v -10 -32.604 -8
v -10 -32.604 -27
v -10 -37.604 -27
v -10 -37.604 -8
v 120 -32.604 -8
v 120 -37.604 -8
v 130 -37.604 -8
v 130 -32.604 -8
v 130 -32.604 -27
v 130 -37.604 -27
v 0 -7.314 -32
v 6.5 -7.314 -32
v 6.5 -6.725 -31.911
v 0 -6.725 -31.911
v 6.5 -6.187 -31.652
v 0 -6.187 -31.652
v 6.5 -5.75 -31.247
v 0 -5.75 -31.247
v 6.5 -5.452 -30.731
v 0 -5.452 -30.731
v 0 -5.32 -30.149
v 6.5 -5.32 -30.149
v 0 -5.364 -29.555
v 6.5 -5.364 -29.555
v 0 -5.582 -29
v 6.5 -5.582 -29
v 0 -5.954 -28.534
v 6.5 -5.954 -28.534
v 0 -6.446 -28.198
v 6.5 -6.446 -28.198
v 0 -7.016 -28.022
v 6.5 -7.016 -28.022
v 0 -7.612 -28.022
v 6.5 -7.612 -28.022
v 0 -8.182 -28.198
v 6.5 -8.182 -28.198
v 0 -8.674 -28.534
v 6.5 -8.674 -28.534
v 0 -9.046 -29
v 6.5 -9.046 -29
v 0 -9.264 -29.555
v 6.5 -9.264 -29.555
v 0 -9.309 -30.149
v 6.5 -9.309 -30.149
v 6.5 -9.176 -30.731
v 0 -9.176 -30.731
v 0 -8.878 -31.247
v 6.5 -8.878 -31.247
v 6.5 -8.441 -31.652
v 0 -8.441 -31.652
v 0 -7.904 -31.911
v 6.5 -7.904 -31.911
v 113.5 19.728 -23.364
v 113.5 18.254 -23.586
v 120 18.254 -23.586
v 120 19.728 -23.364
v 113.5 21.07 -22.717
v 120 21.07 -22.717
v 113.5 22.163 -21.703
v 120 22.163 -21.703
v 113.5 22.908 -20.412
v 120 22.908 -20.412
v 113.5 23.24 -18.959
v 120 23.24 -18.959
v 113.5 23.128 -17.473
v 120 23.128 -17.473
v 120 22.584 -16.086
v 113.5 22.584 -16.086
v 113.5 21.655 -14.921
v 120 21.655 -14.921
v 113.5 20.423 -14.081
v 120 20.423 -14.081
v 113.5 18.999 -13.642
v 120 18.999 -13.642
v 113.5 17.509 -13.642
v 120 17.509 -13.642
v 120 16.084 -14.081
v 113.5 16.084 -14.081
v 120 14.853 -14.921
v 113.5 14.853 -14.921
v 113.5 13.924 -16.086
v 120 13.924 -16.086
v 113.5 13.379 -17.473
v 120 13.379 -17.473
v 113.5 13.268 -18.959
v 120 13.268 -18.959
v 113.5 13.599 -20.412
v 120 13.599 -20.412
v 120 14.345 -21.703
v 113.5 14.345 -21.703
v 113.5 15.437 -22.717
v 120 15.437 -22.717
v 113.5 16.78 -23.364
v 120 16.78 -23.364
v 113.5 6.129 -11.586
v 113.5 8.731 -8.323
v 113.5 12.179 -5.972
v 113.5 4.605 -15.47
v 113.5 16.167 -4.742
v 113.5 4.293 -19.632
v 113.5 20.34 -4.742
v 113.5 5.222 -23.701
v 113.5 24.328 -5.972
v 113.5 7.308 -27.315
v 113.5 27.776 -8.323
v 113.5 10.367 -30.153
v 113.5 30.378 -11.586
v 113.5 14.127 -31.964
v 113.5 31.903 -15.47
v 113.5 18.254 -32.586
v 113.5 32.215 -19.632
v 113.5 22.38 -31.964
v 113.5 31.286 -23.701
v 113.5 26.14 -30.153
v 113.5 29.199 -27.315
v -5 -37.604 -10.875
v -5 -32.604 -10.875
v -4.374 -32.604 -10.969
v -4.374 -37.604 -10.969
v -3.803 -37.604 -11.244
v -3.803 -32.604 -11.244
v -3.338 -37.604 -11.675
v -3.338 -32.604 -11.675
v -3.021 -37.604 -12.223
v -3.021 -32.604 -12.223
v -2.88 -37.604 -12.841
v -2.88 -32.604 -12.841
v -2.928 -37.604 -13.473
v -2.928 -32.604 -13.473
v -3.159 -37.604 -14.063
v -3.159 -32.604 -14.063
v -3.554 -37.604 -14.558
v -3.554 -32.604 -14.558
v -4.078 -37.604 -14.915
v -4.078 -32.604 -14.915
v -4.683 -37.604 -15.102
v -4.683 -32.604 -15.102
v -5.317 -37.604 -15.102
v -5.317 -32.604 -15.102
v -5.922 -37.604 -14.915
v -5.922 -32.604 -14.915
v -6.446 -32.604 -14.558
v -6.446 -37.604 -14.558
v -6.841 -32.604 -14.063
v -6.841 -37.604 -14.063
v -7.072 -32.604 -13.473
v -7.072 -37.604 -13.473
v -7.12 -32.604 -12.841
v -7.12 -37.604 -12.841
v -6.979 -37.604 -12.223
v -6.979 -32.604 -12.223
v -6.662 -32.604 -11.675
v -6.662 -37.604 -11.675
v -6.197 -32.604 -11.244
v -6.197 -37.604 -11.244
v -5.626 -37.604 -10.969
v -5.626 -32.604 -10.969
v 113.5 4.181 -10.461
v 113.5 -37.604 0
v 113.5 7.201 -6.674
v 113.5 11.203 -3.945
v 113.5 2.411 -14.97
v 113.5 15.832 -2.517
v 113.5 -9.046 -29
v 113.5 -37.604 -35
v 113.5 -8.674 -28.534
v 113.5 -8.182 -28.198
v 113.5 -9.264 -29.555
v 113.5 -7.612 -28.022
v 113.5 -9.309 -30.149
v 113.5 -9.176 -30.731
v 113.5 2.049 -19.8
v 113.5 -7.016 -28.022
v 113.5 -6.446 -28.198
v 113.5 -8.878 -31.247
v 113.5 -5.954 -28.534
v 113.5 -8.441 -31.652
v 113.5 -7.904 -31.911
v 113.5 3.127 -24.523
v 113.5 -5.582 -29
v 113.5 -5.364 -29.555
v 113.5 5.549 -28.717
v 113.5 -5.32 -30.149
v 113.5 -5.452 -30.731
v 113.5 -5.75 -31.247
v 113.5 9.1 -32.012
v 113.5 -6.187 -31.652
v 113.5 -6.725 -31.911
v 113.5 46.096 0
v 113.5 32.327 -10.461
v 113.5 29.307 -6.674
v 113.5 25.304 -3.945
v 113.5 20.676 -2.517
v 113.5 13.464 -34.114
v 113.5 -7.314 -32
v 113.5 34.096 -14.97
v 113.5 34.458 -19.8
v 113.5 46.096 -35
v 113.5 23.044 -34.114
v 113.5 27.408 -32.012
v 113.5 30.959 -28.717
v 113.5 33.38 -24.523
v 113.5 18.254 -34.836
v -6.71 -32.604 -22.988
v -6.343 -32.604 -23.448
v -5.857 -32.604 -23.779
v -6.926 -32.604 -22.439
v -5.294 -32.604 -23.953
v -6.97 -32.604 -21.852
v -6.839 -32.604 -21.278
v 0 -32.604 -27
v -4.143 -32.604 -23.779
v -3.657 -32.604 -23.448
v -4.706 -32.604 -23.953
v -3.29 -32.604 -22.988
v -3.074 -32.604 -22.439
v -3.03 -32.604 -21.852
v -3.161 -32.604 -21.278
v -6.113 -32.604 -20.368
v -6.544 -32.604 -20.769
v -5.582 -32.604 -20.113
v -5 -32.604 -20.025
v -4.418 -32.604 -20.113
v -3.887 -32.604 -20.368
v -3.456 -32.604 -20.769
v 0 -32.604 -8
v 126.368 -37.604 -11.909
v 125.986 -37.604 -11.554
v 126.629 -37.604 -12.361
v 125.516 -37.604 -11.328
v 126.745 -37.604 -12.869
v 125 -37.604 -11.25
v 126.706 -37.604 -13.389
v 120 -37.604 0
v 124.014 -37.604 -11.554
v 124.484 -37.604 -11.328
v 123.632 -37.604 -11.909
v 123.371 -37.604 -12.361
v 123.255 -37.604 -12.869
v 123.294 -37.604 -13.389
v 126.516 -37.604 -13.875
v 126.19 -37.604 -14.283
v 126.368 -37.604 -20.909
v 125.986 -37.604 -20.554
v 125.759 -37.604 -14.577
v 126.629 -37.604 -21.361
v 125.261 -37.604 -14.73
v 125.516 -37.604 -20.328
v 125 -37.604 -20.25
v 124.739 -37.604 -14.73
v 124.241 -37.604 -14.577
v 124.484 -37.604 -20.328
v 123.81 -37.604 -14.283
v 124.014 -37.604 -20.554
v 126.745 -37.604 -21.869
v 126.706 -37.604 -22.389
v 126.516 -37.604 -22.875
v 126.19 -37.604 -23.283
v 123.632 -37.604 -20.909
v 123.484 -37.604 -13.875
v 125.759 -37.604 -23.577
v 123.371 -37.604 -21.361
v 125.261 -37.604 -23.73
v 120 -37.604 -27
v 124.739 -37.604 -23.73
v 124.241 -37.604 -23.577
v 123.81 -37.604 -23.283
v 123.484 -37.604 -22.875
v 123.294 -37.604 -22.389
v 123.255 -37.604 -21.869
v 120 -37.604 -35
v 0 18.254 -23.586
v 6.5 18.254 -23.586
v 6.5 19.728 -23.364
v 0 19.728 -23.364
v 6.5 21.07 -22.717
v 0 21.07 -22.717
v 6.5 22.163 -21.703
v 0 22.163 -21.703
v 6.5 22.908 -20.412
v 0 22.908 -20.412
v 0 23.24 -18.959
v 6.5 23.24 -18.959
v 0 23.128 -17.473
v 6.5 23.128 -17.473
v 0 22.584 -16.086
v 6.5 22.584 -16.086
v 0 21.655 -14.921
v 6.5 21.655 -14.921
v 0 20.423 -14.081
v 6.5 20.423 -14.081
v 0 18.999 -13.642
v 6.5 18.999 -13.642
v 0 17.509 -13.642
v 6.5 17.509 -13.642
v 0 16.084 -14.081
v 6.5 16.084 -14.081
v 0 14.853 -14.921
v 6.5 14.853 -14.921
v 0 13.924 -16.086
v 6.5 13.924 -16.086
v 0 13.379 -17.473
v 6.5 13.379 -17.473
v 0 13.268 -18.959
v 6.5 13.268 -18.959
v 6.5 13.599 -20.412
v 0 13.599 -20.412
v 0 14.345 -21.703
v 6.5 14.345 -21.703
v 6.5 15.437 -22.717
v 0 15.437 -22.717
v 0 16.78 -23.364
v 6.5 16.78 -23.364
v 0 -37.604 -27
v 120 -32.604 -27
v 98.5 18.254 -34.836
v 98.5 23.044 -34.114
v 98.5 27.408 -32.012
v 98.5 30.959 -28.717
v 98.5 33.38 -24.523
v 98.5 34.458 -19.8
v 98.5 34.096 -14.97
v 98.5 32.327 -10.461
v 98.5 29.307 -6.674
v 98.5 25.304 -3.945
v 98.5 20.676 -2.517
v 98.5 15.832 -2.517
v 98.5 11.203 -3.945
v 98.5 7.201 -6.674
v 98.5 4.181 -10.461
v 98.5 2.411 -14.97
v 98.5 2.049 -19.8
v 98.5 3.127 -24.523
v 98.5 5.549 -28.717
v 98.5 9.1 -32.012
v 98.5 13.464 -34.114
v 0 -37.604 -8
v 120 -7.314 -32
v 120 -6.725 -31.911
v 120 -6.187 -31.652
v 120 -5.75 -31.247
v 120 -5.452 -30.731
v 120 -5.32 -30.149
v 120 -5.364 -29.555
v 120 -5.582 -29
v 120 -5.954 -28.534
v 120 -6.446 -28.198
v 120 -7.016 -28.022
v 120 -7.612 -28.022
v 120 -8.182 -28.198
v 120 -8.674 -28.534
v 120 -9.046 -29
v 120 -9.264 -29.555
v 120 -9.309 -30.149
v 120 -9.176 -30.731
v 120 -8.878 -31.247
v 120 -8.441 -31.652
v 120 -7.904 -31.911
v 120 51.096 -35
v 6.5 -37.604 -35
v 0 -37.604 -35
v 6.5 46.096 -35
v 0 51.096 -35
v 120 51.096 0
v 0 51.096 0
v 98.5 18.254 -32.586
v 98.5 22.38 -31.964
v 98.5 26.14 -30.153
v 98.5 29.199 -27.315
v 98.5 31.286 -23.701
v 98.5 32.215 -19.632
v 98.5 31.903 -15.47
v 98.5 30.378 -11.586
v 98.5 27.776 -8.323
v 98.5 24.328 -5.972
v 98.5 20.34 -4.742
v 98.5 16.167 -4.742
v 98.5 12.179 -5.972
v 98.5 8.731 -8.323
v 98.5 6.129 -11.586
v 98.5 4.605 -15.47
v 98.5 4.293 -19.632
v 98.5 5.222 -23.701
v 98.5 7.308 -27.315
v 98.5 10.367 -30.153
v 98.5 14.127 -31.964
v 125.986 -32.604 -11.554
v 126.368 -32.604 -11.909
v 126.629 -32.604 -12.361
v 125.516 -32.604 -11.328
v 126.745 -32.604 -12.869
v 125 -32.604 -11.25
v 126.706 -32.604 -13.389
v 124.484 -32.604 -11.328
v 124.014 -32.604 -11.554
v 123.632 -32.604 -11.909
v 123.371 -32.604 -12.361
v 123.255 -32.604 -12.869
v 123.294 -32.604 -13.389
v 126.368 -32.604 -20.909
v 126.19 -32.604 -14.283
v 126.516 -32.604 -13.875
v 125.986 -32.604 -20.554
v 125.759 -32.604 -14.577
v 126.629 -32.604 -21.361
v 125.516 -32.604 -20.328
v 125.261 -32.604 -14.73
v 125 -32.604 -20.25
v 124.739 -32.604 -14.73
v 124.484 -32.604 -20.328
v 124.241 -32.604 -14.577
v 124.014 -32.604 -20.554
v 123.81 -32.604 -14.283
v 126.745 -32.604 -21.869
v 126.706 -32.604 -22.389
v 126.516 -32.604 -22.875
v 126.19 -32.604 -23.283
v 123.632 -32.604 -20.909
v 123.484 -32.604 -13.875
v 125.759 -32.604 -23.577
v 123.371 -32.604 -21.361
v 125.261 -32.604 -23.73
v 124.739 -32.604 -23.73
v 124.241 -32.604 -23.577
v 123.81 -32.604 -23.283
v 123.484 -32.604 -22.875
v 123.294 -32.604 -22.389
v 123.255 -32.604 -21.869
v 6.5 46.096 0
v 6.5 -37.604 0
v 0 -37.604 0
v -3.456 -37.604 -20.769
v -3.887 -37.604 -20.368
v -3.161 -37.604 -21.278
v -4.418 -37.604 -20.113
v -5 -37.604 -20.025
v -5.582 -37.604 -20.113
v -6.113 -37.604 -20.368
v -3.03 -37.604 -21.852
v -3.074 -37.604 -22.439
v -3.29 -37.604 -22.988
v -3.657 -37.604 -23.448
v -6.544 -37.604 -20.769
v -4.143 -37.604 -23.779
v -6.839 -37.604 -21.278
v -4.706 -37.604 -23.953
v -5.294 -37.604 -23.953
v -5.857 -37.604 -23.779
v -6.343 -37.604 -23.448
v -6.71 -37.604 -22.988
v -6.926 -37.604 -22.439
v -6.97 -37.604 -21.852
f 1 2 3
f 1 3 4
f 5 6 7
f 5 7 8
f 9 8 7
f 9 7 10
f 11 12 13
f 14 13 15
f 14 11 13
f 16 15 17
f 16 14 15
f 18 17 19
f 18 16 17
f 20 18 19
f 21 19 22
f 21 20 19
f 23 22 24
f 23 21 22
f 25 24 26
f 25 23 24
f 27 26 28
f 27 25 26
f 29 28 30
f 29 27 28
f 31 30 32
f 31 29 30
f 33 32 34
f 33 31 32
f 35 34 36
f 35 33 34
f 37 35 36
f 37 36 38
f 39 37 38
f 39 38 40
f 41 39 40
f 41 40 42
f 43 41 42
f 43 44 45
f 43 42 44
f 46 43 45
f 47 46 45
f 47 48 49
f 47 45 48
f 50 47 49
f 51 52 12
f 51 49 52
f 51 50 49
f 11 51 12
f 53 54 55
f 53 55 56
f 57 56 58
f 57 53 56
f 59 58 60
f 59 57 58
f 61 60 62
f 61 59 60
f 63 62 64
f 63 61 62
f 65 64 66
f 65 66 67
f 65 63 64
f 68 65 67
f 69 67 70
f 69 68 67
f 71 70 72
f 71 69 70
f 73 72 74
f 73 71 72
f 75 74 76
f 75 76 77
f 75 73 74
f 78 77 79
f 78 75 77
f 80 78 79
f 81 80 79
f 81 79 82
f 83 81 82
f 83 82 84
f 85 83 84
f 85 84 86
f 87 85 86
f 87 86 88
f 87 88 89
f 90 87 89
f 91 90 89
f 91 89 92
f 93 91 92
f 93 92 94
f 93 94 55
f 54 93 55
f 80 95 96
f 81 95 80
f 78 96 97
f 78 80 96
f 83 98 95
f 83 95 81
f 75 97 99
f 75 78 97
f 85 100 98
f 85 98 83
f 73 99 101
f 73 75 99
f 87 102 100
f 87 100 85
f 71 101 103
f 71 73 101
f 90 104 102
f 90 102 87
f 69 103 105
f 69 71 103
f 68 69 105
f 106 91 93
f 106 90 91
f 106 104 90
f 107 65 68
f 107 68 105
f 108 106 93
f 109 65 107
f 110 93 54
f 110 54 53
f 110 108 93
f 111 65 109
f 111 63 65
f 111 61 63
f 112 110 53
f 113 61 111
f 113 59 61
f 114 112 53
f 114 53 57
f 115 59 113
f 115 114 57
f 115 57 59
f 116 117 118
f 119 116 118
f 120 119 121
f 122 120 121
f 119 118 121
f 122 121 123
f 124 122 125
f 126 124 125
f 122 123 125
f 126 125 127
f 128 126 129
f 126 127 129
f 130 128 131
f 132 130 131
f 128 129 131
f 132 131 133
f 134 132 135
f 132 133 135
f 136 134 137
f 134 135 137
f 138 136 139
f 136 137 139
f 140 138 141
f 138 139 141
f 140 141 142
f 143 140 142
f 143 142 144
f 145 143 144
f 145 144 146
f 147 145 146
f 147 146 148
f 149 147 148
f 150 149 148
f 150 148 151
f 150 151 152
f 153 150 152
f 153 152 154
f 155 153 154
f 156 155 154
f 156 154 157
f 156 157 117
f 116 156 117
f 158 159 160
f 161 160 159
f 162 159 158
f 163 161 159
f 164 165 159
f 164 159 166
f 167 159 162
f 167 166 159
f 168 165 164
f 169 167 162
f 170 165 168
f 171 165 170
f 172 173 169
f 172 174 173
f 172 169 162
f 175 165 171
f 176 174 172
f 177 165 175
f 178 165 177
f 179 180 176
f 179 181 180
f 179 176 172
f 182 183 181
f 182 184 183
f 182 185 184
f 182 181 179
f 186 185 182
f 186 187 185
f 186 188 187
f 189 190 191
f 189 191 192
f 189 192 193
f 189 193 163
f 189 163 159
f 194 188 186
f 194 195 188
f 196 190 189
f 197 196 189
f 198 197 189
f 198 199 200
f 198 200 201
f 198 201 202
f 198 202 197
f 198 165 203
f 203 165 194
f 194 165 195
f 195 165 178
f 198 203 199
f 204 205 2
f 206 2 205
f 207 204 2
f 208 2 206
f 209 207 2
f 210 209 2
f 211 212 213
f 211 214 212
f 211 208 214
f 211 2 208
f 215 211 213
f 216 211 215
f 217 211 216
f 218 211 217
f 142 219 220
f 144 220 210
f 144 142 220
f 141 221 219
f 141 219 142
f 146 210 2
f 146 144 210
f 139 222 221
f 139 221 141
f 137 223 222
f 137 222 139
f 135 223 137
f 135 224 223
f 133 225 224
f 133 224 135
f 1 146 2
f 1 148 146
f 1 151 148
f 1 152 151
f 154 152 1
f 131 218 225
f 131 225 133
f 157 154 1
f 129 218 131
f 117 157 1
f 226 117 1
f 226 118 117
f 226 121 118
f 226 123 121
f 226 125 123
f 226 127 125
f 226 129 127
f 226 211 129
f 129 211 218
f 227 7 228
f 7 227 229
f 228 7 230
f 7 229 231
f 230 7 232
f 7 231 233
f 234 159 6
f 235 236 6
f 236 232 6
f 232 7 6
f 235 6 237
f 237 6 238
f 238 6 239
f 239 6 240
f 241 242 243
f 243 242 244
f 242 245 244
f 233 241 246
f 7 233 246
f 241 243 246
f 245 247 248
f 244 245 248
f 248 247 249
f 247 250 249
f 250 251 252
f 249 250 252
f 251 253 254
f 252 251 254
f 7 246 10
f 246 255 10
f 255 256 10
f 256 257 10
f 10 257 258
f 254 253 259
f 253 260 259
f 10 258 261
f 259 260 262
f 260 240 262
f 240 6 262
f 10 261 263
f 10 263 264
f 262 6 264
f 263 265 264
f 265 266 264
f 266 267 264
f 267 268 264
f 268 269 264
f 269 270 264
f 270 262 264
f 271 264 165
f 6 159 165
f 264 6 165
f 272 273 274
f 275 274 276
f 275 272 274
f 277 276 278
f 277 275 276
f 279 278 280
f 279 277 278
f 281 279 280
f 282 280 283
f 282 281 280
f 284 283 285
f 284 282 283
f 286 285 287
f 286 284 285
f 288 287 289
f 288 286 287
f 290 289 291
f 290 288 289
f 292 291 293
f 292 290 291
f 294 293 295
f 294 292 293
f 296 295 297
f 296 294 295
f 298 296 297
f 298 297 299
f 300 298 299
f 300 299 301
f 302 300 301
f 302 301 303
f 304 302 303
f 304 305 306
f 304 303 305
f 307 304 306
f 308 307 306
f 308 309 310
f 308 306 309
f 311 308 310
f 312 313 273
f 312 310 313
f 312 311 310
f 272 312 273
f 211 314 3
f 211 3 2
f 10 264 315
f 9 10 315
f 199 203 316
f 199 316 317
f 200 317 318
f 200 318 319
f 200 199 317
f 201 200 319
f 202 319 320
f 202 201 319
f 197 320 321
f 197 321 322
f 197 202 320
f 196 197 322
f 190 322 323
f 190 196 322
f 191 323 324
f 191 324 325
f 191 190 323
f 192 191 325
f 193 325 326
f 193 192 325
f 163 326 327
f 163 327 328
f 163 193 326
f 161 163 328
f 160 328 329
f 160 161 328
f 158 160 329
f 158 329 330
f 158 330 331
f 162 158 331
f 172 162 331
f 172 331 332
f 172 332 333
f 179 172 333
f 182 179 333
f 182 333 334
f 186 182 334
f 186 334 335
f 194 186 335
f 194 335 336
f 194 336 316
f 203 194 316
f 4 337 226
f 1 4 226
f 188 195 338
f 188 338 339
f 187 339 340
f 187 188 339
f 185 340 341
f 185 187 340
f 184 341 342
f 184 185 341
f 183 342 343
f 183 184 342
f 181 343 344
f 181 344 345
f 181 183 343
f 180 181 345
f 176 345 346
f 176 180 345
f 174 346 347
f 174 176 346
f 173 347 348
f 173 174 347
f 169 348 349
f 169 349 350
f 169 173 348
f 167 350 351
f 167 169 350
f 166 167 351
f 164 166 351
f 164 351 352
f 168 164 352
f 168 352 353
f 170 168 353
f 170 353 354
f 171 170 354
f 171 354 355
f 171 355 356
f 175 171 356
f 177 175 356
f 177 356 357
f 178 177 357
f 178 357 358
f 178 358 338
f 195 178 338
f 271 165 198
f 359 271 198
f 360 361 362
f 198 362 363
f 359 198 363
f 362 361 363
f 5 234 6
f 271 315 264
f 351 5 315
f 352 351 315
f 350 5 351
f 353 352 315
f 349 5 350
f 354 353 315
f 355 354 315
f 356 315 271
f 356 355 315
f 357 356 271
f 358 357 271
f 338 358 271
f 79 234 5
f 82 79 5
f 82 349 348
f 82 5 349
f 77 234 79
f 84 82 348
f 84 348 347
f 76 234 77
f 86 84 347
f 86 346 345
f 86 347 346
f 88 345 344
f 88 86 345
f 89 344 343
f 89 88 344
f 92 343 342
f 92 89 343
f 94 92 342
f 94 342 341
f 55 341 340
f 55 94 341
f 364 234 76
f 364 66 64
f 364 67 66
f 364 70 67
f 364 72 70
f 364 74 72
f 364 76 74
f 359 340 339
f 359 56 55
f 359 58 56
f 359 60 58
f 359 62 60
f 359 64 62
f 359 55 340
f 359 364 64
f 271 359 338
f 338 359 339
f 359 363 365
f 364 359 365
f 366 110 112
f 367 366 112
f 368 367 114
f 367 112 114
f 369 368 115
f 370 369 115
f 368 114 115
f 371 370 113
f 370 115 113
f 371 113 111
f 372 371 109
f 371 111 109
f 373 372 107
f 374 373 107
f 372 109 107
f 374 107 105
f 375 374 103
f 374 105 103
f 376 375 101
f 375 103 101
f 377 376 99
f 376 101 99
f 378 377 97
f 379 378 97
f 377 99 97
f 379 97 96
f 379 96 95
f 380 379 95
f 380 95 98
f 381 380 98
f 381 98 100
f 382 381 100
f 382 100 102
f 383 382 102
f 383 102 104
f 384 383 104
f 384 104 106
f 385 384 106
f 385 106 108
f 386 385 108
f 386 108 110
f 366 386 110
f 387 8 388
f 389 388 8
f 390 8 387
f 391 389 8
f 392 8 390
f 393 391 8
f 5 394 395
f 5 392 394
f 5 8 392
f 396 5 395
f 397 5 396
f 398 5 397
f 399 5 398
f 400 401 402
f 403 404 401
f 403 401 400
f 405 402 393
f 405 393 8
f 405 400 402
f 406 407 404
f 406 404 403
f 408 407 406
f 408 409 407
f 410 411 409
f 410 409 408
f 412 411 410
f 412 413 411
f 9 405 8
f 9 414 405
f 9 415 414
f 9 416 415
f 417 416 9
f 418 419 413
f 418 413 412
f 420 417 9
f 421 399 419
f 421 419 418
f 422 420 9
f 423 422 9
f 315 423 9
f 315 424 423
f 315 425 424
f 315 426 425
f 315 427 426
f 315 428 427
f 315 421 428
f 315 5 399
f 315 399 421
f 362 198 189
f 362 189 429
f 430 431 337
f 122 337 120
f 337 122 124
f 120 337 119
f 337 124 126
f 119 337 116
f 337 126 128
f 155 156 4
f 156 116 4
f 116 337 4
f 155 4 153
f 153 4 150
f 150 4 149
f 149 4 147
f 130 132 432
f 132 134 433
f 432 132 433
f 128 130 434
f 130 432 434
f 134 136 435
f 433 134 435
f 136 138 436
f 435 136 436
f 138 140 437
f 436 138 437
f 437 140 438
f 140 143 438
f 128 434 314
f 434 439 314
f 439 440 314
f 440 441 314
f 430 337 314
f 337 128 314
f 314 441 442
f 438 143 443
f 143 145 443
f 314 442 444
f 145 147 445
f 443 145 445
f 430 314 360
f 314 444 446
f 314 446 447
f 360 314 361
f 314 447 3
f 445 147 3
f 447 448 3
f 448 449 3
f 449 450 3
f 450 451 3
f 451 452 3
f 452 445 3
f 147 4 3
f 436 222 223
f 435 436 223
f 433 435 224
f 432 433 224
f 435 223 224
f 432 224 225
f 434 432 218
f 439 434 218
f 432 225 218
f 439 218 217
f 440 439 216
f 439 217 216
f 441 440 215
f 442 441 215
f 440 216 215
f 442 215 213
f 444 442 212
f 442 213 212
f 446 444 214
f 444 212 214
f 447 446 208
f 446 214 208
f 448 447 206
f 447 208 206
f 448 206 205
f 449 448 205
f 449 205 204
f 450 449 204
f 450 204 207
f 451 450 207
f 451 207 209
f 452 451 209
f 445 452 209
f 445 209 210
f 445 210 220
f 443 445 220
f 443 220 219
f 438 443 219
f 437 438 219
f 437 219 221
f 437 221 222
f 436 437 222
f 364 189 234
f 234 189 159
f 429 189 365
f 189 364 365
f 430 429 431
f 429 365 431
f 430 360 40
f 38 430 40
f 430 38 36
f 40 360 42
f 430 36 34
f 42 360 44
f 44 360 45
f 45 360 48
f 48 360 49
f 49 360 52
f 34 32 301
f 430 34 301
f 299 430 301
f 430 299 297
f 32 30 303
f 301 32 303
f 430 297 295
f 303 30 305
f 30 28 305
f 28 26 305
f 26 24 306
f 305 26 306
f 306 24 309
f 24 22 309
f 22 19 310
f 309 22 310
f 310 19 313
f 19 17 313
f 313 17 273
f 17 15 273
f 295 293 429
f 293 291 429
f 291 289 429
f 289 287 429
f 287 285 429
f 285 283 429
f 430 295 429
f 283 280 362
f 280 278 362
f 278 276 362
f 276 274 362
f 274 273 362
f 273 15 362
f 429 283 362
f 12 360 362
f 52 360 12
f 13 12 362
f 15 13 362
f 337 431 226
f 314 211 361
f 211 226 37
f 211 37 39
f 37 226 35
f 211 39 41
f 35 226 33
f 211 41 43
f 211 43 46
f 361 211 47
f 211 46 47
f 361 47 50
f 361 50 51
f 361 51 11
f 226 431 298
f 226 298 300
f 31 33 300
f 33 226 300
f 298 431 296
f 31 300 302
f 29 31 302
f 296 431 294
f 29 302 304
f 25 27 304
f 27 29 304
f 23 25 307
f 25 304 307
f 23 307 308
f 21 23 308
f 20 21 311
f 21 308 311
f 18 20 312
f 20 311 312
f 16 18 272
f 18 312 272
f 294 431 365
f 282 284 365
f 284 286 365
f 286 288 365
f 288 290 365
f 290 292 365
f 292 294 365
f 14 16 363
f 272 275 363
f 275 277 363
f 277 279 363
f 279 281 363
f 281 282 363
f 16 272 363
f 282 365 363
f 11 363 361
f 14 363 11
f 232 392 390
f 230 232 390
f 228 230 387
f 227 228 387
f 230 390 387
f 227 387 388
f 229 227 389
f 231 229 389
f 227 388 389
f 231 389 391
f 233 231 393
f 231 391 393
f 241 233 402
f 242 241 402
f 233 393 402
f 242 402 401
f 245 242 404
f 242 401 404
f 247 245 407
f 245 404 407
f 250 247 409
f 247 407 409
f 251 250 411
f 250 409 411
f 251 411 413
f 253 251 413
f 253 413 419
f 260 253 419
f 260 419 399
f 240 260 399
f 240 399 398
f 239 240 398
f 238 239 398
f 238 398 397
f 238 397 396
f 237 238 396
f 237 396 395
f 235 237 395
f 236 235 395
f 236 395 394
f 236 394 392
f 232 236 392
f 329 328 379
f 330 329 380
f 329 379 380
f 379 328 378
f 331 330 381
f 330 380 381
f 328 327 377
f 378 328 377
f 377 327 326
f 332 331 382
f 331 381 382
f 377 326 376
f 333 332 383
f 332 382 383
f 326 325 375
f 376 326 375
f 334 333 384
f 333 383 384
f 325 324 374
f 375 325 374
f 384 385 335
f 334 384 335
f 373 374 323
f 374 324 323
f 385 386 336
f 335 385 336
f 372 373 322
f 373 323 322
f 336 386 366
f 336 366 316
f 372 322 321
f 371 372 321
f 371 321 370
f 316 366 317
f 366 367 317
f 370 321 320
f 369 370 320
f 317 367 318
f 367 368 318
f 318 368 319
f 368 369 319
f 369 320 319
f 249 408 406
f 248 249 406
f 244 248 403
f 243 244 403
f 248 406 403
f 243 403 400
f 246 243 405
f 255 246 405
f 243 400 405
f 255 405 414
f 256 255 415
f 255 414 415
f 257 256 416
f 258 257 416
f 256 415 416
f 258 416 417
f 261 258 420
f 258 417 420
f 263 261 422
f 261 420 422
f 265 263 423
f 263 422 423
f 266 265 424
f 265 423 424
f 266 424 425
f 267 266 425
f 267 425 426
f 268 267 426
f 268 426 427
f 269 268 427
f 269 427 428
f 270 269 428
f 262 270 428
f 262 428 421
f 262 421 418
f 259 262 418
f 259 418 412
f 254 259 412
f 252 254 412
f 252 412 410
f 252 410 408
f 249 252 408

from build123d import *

# Parameters (mm, degrees)
ESQUISSE4_R             = 2
ESQUISSE4_R_2           = 5
BOSS_EXTRU_1_DEPTH      = 120
ESQUISSE19_W            = 107
ESQUISSE19_H            = 83.7
ENL_V_MAT_EXTRU_1_DEPTH = 120
ESQUISSE20_R            = 16.25
ESQUISSE20_R_2          = 14
BOSS_EXTRU_2_DEPTH      = 21.5
ESQUISSE28_W            = 19
ESQUISSE28_H            = 5
BOSS_EXTRU_6_DEPTH      = 10
ESQUISSE29_R            = 1.75
ENL_V_MAT_EXTRU_6_DEPTH = 10
ESQUISSE33_W            = 19
ESQUISSE33_H            = 5
BOSS_EXTRU_7_DEPTH      = 10
ESQUISSE34_R            = 1.975077454
ESQUISSE34_R_2          = 2.125479737
ENL_V_MAT_EXTRU_7_DEPTH = 159.52662237


with BuildPart() as part:
    # Esquisse4 → Boss.-Extru.1 (new body)
    with BuildSketch(Plane(origin=(0, 0, 0), x_dir=(0, 0, -1), z_dir=(1, 0, 0))):
        Polygon((30, -37.604112468), (35, -37.604112468), (35, 51.095887532), (0, 51.095887532), (0, -37.604112468), align=None)
        with Locations((30, -7.314112468)):
            Circle(ESQUISSE4_R, mode=Mode.SUBTRACT)
        with Locations((18.58577647, 18.253748241)):
            Circle(ESQUISSE4_R_2, mode=Mode.SUBTRACT)
    extrude(amount=BOSS_EXTRU_1_DEPTH)

    # Esquisse19 → Enlèv. mat.-Extru.1 (cut)
    with BuildSketch(Plane(origin=(0, 0, -35), x_dir=(-1, 0, 0), z_dir=(0, 0, -1))):
        with Locations((-60, 4.245887532)):
            Rectangle(ESQUISSE19_W, ESQUISSE19_H)
    extrude(amount=-ENL_V_MAT_EXTRU_1_DEPTH, mode=Mode.SUBTRACT)

    # Esquisse20 → Boss.-Extru.2 (add)
    with BuildSketch(Plane(origin=(120, 0, 0), x_dir=(0, 0, -1), z_dir=(1, 0, 0))):
        with Locations((18.58577647, 18.253748241)):
            Circle(ESQUISSE20_R)
        with Locations((18.58577647, 18.253748241)):
            Circle(ESQUISSE20_R_2, mode=Mode.SUBTRACT)
    extrude(amount=-BOSS_EXTRU_2_DEPTH)

    # Esquisse28 → Boss.-Extru.6 (add)
    with BuildSketch(Plane(origin=(120, 0, 0), x_dir=(0, 0, -1), z_dir=(1, 0, 0))):
        with Locations((17.5, -35.104112468)):
            Rectangle(ESQUISSE28_W, ESQUISSE28_H)
    extrude(amount=BOSS_EXTRU_6_DEPTH)

    # Esquisse29 → Enlèv. mat.-Extru.6 (cut)
    with BuildSketch(Plane(origin=(0, -32.604112468, 0), x_dir=(1, 0, 0), z_dir=(0, 1, 0))):
        with Locations(Location((125, 22, 0), (0, 0, 270))):
            Circle(ESQUISSE29_R)
        with Locations(Location((125, 13, 0), (0, 0, 270))):
            Circle(ESQUISSE29_R)
    extrude(amount=-ENL_V_MAT_EXTRU_6_DEPTH, mode=Mode.SUBTRACT)

    # Esquisse33 → Boss.-Extru.7 (add)
    with BuildSketch(Plane.ZY):
        with Locations((-17.5, -35.104112468)):
            Rectangle(ESQUISSE33_W, ESQUISSE33_H)
    extrude(amount=BOSS_EXTRU_7_DEPTH)

    # Esquisse34 → Enlèv. mat.-Extru.7 (cut, through all)
    with BuildSketch(Plane(origin=(0, -32.604112468, 0), x_dir=(1, 0, 0), z_dir=(0, 1, 0))):
        with Locations(Location((-5, 22, 0), (0, 0, 270))):
            Circle(ESQUISSE34_R)
        with Locations(Location((-5, 13, 0), (0, 0, 270))):
            Circle(ESQUISSE34_R_2)
    extrude(amount=-ENL_V_MAT_EXTRU_7_DEPTH, mode=Mode.SUBTRACT)


solid = part.part
